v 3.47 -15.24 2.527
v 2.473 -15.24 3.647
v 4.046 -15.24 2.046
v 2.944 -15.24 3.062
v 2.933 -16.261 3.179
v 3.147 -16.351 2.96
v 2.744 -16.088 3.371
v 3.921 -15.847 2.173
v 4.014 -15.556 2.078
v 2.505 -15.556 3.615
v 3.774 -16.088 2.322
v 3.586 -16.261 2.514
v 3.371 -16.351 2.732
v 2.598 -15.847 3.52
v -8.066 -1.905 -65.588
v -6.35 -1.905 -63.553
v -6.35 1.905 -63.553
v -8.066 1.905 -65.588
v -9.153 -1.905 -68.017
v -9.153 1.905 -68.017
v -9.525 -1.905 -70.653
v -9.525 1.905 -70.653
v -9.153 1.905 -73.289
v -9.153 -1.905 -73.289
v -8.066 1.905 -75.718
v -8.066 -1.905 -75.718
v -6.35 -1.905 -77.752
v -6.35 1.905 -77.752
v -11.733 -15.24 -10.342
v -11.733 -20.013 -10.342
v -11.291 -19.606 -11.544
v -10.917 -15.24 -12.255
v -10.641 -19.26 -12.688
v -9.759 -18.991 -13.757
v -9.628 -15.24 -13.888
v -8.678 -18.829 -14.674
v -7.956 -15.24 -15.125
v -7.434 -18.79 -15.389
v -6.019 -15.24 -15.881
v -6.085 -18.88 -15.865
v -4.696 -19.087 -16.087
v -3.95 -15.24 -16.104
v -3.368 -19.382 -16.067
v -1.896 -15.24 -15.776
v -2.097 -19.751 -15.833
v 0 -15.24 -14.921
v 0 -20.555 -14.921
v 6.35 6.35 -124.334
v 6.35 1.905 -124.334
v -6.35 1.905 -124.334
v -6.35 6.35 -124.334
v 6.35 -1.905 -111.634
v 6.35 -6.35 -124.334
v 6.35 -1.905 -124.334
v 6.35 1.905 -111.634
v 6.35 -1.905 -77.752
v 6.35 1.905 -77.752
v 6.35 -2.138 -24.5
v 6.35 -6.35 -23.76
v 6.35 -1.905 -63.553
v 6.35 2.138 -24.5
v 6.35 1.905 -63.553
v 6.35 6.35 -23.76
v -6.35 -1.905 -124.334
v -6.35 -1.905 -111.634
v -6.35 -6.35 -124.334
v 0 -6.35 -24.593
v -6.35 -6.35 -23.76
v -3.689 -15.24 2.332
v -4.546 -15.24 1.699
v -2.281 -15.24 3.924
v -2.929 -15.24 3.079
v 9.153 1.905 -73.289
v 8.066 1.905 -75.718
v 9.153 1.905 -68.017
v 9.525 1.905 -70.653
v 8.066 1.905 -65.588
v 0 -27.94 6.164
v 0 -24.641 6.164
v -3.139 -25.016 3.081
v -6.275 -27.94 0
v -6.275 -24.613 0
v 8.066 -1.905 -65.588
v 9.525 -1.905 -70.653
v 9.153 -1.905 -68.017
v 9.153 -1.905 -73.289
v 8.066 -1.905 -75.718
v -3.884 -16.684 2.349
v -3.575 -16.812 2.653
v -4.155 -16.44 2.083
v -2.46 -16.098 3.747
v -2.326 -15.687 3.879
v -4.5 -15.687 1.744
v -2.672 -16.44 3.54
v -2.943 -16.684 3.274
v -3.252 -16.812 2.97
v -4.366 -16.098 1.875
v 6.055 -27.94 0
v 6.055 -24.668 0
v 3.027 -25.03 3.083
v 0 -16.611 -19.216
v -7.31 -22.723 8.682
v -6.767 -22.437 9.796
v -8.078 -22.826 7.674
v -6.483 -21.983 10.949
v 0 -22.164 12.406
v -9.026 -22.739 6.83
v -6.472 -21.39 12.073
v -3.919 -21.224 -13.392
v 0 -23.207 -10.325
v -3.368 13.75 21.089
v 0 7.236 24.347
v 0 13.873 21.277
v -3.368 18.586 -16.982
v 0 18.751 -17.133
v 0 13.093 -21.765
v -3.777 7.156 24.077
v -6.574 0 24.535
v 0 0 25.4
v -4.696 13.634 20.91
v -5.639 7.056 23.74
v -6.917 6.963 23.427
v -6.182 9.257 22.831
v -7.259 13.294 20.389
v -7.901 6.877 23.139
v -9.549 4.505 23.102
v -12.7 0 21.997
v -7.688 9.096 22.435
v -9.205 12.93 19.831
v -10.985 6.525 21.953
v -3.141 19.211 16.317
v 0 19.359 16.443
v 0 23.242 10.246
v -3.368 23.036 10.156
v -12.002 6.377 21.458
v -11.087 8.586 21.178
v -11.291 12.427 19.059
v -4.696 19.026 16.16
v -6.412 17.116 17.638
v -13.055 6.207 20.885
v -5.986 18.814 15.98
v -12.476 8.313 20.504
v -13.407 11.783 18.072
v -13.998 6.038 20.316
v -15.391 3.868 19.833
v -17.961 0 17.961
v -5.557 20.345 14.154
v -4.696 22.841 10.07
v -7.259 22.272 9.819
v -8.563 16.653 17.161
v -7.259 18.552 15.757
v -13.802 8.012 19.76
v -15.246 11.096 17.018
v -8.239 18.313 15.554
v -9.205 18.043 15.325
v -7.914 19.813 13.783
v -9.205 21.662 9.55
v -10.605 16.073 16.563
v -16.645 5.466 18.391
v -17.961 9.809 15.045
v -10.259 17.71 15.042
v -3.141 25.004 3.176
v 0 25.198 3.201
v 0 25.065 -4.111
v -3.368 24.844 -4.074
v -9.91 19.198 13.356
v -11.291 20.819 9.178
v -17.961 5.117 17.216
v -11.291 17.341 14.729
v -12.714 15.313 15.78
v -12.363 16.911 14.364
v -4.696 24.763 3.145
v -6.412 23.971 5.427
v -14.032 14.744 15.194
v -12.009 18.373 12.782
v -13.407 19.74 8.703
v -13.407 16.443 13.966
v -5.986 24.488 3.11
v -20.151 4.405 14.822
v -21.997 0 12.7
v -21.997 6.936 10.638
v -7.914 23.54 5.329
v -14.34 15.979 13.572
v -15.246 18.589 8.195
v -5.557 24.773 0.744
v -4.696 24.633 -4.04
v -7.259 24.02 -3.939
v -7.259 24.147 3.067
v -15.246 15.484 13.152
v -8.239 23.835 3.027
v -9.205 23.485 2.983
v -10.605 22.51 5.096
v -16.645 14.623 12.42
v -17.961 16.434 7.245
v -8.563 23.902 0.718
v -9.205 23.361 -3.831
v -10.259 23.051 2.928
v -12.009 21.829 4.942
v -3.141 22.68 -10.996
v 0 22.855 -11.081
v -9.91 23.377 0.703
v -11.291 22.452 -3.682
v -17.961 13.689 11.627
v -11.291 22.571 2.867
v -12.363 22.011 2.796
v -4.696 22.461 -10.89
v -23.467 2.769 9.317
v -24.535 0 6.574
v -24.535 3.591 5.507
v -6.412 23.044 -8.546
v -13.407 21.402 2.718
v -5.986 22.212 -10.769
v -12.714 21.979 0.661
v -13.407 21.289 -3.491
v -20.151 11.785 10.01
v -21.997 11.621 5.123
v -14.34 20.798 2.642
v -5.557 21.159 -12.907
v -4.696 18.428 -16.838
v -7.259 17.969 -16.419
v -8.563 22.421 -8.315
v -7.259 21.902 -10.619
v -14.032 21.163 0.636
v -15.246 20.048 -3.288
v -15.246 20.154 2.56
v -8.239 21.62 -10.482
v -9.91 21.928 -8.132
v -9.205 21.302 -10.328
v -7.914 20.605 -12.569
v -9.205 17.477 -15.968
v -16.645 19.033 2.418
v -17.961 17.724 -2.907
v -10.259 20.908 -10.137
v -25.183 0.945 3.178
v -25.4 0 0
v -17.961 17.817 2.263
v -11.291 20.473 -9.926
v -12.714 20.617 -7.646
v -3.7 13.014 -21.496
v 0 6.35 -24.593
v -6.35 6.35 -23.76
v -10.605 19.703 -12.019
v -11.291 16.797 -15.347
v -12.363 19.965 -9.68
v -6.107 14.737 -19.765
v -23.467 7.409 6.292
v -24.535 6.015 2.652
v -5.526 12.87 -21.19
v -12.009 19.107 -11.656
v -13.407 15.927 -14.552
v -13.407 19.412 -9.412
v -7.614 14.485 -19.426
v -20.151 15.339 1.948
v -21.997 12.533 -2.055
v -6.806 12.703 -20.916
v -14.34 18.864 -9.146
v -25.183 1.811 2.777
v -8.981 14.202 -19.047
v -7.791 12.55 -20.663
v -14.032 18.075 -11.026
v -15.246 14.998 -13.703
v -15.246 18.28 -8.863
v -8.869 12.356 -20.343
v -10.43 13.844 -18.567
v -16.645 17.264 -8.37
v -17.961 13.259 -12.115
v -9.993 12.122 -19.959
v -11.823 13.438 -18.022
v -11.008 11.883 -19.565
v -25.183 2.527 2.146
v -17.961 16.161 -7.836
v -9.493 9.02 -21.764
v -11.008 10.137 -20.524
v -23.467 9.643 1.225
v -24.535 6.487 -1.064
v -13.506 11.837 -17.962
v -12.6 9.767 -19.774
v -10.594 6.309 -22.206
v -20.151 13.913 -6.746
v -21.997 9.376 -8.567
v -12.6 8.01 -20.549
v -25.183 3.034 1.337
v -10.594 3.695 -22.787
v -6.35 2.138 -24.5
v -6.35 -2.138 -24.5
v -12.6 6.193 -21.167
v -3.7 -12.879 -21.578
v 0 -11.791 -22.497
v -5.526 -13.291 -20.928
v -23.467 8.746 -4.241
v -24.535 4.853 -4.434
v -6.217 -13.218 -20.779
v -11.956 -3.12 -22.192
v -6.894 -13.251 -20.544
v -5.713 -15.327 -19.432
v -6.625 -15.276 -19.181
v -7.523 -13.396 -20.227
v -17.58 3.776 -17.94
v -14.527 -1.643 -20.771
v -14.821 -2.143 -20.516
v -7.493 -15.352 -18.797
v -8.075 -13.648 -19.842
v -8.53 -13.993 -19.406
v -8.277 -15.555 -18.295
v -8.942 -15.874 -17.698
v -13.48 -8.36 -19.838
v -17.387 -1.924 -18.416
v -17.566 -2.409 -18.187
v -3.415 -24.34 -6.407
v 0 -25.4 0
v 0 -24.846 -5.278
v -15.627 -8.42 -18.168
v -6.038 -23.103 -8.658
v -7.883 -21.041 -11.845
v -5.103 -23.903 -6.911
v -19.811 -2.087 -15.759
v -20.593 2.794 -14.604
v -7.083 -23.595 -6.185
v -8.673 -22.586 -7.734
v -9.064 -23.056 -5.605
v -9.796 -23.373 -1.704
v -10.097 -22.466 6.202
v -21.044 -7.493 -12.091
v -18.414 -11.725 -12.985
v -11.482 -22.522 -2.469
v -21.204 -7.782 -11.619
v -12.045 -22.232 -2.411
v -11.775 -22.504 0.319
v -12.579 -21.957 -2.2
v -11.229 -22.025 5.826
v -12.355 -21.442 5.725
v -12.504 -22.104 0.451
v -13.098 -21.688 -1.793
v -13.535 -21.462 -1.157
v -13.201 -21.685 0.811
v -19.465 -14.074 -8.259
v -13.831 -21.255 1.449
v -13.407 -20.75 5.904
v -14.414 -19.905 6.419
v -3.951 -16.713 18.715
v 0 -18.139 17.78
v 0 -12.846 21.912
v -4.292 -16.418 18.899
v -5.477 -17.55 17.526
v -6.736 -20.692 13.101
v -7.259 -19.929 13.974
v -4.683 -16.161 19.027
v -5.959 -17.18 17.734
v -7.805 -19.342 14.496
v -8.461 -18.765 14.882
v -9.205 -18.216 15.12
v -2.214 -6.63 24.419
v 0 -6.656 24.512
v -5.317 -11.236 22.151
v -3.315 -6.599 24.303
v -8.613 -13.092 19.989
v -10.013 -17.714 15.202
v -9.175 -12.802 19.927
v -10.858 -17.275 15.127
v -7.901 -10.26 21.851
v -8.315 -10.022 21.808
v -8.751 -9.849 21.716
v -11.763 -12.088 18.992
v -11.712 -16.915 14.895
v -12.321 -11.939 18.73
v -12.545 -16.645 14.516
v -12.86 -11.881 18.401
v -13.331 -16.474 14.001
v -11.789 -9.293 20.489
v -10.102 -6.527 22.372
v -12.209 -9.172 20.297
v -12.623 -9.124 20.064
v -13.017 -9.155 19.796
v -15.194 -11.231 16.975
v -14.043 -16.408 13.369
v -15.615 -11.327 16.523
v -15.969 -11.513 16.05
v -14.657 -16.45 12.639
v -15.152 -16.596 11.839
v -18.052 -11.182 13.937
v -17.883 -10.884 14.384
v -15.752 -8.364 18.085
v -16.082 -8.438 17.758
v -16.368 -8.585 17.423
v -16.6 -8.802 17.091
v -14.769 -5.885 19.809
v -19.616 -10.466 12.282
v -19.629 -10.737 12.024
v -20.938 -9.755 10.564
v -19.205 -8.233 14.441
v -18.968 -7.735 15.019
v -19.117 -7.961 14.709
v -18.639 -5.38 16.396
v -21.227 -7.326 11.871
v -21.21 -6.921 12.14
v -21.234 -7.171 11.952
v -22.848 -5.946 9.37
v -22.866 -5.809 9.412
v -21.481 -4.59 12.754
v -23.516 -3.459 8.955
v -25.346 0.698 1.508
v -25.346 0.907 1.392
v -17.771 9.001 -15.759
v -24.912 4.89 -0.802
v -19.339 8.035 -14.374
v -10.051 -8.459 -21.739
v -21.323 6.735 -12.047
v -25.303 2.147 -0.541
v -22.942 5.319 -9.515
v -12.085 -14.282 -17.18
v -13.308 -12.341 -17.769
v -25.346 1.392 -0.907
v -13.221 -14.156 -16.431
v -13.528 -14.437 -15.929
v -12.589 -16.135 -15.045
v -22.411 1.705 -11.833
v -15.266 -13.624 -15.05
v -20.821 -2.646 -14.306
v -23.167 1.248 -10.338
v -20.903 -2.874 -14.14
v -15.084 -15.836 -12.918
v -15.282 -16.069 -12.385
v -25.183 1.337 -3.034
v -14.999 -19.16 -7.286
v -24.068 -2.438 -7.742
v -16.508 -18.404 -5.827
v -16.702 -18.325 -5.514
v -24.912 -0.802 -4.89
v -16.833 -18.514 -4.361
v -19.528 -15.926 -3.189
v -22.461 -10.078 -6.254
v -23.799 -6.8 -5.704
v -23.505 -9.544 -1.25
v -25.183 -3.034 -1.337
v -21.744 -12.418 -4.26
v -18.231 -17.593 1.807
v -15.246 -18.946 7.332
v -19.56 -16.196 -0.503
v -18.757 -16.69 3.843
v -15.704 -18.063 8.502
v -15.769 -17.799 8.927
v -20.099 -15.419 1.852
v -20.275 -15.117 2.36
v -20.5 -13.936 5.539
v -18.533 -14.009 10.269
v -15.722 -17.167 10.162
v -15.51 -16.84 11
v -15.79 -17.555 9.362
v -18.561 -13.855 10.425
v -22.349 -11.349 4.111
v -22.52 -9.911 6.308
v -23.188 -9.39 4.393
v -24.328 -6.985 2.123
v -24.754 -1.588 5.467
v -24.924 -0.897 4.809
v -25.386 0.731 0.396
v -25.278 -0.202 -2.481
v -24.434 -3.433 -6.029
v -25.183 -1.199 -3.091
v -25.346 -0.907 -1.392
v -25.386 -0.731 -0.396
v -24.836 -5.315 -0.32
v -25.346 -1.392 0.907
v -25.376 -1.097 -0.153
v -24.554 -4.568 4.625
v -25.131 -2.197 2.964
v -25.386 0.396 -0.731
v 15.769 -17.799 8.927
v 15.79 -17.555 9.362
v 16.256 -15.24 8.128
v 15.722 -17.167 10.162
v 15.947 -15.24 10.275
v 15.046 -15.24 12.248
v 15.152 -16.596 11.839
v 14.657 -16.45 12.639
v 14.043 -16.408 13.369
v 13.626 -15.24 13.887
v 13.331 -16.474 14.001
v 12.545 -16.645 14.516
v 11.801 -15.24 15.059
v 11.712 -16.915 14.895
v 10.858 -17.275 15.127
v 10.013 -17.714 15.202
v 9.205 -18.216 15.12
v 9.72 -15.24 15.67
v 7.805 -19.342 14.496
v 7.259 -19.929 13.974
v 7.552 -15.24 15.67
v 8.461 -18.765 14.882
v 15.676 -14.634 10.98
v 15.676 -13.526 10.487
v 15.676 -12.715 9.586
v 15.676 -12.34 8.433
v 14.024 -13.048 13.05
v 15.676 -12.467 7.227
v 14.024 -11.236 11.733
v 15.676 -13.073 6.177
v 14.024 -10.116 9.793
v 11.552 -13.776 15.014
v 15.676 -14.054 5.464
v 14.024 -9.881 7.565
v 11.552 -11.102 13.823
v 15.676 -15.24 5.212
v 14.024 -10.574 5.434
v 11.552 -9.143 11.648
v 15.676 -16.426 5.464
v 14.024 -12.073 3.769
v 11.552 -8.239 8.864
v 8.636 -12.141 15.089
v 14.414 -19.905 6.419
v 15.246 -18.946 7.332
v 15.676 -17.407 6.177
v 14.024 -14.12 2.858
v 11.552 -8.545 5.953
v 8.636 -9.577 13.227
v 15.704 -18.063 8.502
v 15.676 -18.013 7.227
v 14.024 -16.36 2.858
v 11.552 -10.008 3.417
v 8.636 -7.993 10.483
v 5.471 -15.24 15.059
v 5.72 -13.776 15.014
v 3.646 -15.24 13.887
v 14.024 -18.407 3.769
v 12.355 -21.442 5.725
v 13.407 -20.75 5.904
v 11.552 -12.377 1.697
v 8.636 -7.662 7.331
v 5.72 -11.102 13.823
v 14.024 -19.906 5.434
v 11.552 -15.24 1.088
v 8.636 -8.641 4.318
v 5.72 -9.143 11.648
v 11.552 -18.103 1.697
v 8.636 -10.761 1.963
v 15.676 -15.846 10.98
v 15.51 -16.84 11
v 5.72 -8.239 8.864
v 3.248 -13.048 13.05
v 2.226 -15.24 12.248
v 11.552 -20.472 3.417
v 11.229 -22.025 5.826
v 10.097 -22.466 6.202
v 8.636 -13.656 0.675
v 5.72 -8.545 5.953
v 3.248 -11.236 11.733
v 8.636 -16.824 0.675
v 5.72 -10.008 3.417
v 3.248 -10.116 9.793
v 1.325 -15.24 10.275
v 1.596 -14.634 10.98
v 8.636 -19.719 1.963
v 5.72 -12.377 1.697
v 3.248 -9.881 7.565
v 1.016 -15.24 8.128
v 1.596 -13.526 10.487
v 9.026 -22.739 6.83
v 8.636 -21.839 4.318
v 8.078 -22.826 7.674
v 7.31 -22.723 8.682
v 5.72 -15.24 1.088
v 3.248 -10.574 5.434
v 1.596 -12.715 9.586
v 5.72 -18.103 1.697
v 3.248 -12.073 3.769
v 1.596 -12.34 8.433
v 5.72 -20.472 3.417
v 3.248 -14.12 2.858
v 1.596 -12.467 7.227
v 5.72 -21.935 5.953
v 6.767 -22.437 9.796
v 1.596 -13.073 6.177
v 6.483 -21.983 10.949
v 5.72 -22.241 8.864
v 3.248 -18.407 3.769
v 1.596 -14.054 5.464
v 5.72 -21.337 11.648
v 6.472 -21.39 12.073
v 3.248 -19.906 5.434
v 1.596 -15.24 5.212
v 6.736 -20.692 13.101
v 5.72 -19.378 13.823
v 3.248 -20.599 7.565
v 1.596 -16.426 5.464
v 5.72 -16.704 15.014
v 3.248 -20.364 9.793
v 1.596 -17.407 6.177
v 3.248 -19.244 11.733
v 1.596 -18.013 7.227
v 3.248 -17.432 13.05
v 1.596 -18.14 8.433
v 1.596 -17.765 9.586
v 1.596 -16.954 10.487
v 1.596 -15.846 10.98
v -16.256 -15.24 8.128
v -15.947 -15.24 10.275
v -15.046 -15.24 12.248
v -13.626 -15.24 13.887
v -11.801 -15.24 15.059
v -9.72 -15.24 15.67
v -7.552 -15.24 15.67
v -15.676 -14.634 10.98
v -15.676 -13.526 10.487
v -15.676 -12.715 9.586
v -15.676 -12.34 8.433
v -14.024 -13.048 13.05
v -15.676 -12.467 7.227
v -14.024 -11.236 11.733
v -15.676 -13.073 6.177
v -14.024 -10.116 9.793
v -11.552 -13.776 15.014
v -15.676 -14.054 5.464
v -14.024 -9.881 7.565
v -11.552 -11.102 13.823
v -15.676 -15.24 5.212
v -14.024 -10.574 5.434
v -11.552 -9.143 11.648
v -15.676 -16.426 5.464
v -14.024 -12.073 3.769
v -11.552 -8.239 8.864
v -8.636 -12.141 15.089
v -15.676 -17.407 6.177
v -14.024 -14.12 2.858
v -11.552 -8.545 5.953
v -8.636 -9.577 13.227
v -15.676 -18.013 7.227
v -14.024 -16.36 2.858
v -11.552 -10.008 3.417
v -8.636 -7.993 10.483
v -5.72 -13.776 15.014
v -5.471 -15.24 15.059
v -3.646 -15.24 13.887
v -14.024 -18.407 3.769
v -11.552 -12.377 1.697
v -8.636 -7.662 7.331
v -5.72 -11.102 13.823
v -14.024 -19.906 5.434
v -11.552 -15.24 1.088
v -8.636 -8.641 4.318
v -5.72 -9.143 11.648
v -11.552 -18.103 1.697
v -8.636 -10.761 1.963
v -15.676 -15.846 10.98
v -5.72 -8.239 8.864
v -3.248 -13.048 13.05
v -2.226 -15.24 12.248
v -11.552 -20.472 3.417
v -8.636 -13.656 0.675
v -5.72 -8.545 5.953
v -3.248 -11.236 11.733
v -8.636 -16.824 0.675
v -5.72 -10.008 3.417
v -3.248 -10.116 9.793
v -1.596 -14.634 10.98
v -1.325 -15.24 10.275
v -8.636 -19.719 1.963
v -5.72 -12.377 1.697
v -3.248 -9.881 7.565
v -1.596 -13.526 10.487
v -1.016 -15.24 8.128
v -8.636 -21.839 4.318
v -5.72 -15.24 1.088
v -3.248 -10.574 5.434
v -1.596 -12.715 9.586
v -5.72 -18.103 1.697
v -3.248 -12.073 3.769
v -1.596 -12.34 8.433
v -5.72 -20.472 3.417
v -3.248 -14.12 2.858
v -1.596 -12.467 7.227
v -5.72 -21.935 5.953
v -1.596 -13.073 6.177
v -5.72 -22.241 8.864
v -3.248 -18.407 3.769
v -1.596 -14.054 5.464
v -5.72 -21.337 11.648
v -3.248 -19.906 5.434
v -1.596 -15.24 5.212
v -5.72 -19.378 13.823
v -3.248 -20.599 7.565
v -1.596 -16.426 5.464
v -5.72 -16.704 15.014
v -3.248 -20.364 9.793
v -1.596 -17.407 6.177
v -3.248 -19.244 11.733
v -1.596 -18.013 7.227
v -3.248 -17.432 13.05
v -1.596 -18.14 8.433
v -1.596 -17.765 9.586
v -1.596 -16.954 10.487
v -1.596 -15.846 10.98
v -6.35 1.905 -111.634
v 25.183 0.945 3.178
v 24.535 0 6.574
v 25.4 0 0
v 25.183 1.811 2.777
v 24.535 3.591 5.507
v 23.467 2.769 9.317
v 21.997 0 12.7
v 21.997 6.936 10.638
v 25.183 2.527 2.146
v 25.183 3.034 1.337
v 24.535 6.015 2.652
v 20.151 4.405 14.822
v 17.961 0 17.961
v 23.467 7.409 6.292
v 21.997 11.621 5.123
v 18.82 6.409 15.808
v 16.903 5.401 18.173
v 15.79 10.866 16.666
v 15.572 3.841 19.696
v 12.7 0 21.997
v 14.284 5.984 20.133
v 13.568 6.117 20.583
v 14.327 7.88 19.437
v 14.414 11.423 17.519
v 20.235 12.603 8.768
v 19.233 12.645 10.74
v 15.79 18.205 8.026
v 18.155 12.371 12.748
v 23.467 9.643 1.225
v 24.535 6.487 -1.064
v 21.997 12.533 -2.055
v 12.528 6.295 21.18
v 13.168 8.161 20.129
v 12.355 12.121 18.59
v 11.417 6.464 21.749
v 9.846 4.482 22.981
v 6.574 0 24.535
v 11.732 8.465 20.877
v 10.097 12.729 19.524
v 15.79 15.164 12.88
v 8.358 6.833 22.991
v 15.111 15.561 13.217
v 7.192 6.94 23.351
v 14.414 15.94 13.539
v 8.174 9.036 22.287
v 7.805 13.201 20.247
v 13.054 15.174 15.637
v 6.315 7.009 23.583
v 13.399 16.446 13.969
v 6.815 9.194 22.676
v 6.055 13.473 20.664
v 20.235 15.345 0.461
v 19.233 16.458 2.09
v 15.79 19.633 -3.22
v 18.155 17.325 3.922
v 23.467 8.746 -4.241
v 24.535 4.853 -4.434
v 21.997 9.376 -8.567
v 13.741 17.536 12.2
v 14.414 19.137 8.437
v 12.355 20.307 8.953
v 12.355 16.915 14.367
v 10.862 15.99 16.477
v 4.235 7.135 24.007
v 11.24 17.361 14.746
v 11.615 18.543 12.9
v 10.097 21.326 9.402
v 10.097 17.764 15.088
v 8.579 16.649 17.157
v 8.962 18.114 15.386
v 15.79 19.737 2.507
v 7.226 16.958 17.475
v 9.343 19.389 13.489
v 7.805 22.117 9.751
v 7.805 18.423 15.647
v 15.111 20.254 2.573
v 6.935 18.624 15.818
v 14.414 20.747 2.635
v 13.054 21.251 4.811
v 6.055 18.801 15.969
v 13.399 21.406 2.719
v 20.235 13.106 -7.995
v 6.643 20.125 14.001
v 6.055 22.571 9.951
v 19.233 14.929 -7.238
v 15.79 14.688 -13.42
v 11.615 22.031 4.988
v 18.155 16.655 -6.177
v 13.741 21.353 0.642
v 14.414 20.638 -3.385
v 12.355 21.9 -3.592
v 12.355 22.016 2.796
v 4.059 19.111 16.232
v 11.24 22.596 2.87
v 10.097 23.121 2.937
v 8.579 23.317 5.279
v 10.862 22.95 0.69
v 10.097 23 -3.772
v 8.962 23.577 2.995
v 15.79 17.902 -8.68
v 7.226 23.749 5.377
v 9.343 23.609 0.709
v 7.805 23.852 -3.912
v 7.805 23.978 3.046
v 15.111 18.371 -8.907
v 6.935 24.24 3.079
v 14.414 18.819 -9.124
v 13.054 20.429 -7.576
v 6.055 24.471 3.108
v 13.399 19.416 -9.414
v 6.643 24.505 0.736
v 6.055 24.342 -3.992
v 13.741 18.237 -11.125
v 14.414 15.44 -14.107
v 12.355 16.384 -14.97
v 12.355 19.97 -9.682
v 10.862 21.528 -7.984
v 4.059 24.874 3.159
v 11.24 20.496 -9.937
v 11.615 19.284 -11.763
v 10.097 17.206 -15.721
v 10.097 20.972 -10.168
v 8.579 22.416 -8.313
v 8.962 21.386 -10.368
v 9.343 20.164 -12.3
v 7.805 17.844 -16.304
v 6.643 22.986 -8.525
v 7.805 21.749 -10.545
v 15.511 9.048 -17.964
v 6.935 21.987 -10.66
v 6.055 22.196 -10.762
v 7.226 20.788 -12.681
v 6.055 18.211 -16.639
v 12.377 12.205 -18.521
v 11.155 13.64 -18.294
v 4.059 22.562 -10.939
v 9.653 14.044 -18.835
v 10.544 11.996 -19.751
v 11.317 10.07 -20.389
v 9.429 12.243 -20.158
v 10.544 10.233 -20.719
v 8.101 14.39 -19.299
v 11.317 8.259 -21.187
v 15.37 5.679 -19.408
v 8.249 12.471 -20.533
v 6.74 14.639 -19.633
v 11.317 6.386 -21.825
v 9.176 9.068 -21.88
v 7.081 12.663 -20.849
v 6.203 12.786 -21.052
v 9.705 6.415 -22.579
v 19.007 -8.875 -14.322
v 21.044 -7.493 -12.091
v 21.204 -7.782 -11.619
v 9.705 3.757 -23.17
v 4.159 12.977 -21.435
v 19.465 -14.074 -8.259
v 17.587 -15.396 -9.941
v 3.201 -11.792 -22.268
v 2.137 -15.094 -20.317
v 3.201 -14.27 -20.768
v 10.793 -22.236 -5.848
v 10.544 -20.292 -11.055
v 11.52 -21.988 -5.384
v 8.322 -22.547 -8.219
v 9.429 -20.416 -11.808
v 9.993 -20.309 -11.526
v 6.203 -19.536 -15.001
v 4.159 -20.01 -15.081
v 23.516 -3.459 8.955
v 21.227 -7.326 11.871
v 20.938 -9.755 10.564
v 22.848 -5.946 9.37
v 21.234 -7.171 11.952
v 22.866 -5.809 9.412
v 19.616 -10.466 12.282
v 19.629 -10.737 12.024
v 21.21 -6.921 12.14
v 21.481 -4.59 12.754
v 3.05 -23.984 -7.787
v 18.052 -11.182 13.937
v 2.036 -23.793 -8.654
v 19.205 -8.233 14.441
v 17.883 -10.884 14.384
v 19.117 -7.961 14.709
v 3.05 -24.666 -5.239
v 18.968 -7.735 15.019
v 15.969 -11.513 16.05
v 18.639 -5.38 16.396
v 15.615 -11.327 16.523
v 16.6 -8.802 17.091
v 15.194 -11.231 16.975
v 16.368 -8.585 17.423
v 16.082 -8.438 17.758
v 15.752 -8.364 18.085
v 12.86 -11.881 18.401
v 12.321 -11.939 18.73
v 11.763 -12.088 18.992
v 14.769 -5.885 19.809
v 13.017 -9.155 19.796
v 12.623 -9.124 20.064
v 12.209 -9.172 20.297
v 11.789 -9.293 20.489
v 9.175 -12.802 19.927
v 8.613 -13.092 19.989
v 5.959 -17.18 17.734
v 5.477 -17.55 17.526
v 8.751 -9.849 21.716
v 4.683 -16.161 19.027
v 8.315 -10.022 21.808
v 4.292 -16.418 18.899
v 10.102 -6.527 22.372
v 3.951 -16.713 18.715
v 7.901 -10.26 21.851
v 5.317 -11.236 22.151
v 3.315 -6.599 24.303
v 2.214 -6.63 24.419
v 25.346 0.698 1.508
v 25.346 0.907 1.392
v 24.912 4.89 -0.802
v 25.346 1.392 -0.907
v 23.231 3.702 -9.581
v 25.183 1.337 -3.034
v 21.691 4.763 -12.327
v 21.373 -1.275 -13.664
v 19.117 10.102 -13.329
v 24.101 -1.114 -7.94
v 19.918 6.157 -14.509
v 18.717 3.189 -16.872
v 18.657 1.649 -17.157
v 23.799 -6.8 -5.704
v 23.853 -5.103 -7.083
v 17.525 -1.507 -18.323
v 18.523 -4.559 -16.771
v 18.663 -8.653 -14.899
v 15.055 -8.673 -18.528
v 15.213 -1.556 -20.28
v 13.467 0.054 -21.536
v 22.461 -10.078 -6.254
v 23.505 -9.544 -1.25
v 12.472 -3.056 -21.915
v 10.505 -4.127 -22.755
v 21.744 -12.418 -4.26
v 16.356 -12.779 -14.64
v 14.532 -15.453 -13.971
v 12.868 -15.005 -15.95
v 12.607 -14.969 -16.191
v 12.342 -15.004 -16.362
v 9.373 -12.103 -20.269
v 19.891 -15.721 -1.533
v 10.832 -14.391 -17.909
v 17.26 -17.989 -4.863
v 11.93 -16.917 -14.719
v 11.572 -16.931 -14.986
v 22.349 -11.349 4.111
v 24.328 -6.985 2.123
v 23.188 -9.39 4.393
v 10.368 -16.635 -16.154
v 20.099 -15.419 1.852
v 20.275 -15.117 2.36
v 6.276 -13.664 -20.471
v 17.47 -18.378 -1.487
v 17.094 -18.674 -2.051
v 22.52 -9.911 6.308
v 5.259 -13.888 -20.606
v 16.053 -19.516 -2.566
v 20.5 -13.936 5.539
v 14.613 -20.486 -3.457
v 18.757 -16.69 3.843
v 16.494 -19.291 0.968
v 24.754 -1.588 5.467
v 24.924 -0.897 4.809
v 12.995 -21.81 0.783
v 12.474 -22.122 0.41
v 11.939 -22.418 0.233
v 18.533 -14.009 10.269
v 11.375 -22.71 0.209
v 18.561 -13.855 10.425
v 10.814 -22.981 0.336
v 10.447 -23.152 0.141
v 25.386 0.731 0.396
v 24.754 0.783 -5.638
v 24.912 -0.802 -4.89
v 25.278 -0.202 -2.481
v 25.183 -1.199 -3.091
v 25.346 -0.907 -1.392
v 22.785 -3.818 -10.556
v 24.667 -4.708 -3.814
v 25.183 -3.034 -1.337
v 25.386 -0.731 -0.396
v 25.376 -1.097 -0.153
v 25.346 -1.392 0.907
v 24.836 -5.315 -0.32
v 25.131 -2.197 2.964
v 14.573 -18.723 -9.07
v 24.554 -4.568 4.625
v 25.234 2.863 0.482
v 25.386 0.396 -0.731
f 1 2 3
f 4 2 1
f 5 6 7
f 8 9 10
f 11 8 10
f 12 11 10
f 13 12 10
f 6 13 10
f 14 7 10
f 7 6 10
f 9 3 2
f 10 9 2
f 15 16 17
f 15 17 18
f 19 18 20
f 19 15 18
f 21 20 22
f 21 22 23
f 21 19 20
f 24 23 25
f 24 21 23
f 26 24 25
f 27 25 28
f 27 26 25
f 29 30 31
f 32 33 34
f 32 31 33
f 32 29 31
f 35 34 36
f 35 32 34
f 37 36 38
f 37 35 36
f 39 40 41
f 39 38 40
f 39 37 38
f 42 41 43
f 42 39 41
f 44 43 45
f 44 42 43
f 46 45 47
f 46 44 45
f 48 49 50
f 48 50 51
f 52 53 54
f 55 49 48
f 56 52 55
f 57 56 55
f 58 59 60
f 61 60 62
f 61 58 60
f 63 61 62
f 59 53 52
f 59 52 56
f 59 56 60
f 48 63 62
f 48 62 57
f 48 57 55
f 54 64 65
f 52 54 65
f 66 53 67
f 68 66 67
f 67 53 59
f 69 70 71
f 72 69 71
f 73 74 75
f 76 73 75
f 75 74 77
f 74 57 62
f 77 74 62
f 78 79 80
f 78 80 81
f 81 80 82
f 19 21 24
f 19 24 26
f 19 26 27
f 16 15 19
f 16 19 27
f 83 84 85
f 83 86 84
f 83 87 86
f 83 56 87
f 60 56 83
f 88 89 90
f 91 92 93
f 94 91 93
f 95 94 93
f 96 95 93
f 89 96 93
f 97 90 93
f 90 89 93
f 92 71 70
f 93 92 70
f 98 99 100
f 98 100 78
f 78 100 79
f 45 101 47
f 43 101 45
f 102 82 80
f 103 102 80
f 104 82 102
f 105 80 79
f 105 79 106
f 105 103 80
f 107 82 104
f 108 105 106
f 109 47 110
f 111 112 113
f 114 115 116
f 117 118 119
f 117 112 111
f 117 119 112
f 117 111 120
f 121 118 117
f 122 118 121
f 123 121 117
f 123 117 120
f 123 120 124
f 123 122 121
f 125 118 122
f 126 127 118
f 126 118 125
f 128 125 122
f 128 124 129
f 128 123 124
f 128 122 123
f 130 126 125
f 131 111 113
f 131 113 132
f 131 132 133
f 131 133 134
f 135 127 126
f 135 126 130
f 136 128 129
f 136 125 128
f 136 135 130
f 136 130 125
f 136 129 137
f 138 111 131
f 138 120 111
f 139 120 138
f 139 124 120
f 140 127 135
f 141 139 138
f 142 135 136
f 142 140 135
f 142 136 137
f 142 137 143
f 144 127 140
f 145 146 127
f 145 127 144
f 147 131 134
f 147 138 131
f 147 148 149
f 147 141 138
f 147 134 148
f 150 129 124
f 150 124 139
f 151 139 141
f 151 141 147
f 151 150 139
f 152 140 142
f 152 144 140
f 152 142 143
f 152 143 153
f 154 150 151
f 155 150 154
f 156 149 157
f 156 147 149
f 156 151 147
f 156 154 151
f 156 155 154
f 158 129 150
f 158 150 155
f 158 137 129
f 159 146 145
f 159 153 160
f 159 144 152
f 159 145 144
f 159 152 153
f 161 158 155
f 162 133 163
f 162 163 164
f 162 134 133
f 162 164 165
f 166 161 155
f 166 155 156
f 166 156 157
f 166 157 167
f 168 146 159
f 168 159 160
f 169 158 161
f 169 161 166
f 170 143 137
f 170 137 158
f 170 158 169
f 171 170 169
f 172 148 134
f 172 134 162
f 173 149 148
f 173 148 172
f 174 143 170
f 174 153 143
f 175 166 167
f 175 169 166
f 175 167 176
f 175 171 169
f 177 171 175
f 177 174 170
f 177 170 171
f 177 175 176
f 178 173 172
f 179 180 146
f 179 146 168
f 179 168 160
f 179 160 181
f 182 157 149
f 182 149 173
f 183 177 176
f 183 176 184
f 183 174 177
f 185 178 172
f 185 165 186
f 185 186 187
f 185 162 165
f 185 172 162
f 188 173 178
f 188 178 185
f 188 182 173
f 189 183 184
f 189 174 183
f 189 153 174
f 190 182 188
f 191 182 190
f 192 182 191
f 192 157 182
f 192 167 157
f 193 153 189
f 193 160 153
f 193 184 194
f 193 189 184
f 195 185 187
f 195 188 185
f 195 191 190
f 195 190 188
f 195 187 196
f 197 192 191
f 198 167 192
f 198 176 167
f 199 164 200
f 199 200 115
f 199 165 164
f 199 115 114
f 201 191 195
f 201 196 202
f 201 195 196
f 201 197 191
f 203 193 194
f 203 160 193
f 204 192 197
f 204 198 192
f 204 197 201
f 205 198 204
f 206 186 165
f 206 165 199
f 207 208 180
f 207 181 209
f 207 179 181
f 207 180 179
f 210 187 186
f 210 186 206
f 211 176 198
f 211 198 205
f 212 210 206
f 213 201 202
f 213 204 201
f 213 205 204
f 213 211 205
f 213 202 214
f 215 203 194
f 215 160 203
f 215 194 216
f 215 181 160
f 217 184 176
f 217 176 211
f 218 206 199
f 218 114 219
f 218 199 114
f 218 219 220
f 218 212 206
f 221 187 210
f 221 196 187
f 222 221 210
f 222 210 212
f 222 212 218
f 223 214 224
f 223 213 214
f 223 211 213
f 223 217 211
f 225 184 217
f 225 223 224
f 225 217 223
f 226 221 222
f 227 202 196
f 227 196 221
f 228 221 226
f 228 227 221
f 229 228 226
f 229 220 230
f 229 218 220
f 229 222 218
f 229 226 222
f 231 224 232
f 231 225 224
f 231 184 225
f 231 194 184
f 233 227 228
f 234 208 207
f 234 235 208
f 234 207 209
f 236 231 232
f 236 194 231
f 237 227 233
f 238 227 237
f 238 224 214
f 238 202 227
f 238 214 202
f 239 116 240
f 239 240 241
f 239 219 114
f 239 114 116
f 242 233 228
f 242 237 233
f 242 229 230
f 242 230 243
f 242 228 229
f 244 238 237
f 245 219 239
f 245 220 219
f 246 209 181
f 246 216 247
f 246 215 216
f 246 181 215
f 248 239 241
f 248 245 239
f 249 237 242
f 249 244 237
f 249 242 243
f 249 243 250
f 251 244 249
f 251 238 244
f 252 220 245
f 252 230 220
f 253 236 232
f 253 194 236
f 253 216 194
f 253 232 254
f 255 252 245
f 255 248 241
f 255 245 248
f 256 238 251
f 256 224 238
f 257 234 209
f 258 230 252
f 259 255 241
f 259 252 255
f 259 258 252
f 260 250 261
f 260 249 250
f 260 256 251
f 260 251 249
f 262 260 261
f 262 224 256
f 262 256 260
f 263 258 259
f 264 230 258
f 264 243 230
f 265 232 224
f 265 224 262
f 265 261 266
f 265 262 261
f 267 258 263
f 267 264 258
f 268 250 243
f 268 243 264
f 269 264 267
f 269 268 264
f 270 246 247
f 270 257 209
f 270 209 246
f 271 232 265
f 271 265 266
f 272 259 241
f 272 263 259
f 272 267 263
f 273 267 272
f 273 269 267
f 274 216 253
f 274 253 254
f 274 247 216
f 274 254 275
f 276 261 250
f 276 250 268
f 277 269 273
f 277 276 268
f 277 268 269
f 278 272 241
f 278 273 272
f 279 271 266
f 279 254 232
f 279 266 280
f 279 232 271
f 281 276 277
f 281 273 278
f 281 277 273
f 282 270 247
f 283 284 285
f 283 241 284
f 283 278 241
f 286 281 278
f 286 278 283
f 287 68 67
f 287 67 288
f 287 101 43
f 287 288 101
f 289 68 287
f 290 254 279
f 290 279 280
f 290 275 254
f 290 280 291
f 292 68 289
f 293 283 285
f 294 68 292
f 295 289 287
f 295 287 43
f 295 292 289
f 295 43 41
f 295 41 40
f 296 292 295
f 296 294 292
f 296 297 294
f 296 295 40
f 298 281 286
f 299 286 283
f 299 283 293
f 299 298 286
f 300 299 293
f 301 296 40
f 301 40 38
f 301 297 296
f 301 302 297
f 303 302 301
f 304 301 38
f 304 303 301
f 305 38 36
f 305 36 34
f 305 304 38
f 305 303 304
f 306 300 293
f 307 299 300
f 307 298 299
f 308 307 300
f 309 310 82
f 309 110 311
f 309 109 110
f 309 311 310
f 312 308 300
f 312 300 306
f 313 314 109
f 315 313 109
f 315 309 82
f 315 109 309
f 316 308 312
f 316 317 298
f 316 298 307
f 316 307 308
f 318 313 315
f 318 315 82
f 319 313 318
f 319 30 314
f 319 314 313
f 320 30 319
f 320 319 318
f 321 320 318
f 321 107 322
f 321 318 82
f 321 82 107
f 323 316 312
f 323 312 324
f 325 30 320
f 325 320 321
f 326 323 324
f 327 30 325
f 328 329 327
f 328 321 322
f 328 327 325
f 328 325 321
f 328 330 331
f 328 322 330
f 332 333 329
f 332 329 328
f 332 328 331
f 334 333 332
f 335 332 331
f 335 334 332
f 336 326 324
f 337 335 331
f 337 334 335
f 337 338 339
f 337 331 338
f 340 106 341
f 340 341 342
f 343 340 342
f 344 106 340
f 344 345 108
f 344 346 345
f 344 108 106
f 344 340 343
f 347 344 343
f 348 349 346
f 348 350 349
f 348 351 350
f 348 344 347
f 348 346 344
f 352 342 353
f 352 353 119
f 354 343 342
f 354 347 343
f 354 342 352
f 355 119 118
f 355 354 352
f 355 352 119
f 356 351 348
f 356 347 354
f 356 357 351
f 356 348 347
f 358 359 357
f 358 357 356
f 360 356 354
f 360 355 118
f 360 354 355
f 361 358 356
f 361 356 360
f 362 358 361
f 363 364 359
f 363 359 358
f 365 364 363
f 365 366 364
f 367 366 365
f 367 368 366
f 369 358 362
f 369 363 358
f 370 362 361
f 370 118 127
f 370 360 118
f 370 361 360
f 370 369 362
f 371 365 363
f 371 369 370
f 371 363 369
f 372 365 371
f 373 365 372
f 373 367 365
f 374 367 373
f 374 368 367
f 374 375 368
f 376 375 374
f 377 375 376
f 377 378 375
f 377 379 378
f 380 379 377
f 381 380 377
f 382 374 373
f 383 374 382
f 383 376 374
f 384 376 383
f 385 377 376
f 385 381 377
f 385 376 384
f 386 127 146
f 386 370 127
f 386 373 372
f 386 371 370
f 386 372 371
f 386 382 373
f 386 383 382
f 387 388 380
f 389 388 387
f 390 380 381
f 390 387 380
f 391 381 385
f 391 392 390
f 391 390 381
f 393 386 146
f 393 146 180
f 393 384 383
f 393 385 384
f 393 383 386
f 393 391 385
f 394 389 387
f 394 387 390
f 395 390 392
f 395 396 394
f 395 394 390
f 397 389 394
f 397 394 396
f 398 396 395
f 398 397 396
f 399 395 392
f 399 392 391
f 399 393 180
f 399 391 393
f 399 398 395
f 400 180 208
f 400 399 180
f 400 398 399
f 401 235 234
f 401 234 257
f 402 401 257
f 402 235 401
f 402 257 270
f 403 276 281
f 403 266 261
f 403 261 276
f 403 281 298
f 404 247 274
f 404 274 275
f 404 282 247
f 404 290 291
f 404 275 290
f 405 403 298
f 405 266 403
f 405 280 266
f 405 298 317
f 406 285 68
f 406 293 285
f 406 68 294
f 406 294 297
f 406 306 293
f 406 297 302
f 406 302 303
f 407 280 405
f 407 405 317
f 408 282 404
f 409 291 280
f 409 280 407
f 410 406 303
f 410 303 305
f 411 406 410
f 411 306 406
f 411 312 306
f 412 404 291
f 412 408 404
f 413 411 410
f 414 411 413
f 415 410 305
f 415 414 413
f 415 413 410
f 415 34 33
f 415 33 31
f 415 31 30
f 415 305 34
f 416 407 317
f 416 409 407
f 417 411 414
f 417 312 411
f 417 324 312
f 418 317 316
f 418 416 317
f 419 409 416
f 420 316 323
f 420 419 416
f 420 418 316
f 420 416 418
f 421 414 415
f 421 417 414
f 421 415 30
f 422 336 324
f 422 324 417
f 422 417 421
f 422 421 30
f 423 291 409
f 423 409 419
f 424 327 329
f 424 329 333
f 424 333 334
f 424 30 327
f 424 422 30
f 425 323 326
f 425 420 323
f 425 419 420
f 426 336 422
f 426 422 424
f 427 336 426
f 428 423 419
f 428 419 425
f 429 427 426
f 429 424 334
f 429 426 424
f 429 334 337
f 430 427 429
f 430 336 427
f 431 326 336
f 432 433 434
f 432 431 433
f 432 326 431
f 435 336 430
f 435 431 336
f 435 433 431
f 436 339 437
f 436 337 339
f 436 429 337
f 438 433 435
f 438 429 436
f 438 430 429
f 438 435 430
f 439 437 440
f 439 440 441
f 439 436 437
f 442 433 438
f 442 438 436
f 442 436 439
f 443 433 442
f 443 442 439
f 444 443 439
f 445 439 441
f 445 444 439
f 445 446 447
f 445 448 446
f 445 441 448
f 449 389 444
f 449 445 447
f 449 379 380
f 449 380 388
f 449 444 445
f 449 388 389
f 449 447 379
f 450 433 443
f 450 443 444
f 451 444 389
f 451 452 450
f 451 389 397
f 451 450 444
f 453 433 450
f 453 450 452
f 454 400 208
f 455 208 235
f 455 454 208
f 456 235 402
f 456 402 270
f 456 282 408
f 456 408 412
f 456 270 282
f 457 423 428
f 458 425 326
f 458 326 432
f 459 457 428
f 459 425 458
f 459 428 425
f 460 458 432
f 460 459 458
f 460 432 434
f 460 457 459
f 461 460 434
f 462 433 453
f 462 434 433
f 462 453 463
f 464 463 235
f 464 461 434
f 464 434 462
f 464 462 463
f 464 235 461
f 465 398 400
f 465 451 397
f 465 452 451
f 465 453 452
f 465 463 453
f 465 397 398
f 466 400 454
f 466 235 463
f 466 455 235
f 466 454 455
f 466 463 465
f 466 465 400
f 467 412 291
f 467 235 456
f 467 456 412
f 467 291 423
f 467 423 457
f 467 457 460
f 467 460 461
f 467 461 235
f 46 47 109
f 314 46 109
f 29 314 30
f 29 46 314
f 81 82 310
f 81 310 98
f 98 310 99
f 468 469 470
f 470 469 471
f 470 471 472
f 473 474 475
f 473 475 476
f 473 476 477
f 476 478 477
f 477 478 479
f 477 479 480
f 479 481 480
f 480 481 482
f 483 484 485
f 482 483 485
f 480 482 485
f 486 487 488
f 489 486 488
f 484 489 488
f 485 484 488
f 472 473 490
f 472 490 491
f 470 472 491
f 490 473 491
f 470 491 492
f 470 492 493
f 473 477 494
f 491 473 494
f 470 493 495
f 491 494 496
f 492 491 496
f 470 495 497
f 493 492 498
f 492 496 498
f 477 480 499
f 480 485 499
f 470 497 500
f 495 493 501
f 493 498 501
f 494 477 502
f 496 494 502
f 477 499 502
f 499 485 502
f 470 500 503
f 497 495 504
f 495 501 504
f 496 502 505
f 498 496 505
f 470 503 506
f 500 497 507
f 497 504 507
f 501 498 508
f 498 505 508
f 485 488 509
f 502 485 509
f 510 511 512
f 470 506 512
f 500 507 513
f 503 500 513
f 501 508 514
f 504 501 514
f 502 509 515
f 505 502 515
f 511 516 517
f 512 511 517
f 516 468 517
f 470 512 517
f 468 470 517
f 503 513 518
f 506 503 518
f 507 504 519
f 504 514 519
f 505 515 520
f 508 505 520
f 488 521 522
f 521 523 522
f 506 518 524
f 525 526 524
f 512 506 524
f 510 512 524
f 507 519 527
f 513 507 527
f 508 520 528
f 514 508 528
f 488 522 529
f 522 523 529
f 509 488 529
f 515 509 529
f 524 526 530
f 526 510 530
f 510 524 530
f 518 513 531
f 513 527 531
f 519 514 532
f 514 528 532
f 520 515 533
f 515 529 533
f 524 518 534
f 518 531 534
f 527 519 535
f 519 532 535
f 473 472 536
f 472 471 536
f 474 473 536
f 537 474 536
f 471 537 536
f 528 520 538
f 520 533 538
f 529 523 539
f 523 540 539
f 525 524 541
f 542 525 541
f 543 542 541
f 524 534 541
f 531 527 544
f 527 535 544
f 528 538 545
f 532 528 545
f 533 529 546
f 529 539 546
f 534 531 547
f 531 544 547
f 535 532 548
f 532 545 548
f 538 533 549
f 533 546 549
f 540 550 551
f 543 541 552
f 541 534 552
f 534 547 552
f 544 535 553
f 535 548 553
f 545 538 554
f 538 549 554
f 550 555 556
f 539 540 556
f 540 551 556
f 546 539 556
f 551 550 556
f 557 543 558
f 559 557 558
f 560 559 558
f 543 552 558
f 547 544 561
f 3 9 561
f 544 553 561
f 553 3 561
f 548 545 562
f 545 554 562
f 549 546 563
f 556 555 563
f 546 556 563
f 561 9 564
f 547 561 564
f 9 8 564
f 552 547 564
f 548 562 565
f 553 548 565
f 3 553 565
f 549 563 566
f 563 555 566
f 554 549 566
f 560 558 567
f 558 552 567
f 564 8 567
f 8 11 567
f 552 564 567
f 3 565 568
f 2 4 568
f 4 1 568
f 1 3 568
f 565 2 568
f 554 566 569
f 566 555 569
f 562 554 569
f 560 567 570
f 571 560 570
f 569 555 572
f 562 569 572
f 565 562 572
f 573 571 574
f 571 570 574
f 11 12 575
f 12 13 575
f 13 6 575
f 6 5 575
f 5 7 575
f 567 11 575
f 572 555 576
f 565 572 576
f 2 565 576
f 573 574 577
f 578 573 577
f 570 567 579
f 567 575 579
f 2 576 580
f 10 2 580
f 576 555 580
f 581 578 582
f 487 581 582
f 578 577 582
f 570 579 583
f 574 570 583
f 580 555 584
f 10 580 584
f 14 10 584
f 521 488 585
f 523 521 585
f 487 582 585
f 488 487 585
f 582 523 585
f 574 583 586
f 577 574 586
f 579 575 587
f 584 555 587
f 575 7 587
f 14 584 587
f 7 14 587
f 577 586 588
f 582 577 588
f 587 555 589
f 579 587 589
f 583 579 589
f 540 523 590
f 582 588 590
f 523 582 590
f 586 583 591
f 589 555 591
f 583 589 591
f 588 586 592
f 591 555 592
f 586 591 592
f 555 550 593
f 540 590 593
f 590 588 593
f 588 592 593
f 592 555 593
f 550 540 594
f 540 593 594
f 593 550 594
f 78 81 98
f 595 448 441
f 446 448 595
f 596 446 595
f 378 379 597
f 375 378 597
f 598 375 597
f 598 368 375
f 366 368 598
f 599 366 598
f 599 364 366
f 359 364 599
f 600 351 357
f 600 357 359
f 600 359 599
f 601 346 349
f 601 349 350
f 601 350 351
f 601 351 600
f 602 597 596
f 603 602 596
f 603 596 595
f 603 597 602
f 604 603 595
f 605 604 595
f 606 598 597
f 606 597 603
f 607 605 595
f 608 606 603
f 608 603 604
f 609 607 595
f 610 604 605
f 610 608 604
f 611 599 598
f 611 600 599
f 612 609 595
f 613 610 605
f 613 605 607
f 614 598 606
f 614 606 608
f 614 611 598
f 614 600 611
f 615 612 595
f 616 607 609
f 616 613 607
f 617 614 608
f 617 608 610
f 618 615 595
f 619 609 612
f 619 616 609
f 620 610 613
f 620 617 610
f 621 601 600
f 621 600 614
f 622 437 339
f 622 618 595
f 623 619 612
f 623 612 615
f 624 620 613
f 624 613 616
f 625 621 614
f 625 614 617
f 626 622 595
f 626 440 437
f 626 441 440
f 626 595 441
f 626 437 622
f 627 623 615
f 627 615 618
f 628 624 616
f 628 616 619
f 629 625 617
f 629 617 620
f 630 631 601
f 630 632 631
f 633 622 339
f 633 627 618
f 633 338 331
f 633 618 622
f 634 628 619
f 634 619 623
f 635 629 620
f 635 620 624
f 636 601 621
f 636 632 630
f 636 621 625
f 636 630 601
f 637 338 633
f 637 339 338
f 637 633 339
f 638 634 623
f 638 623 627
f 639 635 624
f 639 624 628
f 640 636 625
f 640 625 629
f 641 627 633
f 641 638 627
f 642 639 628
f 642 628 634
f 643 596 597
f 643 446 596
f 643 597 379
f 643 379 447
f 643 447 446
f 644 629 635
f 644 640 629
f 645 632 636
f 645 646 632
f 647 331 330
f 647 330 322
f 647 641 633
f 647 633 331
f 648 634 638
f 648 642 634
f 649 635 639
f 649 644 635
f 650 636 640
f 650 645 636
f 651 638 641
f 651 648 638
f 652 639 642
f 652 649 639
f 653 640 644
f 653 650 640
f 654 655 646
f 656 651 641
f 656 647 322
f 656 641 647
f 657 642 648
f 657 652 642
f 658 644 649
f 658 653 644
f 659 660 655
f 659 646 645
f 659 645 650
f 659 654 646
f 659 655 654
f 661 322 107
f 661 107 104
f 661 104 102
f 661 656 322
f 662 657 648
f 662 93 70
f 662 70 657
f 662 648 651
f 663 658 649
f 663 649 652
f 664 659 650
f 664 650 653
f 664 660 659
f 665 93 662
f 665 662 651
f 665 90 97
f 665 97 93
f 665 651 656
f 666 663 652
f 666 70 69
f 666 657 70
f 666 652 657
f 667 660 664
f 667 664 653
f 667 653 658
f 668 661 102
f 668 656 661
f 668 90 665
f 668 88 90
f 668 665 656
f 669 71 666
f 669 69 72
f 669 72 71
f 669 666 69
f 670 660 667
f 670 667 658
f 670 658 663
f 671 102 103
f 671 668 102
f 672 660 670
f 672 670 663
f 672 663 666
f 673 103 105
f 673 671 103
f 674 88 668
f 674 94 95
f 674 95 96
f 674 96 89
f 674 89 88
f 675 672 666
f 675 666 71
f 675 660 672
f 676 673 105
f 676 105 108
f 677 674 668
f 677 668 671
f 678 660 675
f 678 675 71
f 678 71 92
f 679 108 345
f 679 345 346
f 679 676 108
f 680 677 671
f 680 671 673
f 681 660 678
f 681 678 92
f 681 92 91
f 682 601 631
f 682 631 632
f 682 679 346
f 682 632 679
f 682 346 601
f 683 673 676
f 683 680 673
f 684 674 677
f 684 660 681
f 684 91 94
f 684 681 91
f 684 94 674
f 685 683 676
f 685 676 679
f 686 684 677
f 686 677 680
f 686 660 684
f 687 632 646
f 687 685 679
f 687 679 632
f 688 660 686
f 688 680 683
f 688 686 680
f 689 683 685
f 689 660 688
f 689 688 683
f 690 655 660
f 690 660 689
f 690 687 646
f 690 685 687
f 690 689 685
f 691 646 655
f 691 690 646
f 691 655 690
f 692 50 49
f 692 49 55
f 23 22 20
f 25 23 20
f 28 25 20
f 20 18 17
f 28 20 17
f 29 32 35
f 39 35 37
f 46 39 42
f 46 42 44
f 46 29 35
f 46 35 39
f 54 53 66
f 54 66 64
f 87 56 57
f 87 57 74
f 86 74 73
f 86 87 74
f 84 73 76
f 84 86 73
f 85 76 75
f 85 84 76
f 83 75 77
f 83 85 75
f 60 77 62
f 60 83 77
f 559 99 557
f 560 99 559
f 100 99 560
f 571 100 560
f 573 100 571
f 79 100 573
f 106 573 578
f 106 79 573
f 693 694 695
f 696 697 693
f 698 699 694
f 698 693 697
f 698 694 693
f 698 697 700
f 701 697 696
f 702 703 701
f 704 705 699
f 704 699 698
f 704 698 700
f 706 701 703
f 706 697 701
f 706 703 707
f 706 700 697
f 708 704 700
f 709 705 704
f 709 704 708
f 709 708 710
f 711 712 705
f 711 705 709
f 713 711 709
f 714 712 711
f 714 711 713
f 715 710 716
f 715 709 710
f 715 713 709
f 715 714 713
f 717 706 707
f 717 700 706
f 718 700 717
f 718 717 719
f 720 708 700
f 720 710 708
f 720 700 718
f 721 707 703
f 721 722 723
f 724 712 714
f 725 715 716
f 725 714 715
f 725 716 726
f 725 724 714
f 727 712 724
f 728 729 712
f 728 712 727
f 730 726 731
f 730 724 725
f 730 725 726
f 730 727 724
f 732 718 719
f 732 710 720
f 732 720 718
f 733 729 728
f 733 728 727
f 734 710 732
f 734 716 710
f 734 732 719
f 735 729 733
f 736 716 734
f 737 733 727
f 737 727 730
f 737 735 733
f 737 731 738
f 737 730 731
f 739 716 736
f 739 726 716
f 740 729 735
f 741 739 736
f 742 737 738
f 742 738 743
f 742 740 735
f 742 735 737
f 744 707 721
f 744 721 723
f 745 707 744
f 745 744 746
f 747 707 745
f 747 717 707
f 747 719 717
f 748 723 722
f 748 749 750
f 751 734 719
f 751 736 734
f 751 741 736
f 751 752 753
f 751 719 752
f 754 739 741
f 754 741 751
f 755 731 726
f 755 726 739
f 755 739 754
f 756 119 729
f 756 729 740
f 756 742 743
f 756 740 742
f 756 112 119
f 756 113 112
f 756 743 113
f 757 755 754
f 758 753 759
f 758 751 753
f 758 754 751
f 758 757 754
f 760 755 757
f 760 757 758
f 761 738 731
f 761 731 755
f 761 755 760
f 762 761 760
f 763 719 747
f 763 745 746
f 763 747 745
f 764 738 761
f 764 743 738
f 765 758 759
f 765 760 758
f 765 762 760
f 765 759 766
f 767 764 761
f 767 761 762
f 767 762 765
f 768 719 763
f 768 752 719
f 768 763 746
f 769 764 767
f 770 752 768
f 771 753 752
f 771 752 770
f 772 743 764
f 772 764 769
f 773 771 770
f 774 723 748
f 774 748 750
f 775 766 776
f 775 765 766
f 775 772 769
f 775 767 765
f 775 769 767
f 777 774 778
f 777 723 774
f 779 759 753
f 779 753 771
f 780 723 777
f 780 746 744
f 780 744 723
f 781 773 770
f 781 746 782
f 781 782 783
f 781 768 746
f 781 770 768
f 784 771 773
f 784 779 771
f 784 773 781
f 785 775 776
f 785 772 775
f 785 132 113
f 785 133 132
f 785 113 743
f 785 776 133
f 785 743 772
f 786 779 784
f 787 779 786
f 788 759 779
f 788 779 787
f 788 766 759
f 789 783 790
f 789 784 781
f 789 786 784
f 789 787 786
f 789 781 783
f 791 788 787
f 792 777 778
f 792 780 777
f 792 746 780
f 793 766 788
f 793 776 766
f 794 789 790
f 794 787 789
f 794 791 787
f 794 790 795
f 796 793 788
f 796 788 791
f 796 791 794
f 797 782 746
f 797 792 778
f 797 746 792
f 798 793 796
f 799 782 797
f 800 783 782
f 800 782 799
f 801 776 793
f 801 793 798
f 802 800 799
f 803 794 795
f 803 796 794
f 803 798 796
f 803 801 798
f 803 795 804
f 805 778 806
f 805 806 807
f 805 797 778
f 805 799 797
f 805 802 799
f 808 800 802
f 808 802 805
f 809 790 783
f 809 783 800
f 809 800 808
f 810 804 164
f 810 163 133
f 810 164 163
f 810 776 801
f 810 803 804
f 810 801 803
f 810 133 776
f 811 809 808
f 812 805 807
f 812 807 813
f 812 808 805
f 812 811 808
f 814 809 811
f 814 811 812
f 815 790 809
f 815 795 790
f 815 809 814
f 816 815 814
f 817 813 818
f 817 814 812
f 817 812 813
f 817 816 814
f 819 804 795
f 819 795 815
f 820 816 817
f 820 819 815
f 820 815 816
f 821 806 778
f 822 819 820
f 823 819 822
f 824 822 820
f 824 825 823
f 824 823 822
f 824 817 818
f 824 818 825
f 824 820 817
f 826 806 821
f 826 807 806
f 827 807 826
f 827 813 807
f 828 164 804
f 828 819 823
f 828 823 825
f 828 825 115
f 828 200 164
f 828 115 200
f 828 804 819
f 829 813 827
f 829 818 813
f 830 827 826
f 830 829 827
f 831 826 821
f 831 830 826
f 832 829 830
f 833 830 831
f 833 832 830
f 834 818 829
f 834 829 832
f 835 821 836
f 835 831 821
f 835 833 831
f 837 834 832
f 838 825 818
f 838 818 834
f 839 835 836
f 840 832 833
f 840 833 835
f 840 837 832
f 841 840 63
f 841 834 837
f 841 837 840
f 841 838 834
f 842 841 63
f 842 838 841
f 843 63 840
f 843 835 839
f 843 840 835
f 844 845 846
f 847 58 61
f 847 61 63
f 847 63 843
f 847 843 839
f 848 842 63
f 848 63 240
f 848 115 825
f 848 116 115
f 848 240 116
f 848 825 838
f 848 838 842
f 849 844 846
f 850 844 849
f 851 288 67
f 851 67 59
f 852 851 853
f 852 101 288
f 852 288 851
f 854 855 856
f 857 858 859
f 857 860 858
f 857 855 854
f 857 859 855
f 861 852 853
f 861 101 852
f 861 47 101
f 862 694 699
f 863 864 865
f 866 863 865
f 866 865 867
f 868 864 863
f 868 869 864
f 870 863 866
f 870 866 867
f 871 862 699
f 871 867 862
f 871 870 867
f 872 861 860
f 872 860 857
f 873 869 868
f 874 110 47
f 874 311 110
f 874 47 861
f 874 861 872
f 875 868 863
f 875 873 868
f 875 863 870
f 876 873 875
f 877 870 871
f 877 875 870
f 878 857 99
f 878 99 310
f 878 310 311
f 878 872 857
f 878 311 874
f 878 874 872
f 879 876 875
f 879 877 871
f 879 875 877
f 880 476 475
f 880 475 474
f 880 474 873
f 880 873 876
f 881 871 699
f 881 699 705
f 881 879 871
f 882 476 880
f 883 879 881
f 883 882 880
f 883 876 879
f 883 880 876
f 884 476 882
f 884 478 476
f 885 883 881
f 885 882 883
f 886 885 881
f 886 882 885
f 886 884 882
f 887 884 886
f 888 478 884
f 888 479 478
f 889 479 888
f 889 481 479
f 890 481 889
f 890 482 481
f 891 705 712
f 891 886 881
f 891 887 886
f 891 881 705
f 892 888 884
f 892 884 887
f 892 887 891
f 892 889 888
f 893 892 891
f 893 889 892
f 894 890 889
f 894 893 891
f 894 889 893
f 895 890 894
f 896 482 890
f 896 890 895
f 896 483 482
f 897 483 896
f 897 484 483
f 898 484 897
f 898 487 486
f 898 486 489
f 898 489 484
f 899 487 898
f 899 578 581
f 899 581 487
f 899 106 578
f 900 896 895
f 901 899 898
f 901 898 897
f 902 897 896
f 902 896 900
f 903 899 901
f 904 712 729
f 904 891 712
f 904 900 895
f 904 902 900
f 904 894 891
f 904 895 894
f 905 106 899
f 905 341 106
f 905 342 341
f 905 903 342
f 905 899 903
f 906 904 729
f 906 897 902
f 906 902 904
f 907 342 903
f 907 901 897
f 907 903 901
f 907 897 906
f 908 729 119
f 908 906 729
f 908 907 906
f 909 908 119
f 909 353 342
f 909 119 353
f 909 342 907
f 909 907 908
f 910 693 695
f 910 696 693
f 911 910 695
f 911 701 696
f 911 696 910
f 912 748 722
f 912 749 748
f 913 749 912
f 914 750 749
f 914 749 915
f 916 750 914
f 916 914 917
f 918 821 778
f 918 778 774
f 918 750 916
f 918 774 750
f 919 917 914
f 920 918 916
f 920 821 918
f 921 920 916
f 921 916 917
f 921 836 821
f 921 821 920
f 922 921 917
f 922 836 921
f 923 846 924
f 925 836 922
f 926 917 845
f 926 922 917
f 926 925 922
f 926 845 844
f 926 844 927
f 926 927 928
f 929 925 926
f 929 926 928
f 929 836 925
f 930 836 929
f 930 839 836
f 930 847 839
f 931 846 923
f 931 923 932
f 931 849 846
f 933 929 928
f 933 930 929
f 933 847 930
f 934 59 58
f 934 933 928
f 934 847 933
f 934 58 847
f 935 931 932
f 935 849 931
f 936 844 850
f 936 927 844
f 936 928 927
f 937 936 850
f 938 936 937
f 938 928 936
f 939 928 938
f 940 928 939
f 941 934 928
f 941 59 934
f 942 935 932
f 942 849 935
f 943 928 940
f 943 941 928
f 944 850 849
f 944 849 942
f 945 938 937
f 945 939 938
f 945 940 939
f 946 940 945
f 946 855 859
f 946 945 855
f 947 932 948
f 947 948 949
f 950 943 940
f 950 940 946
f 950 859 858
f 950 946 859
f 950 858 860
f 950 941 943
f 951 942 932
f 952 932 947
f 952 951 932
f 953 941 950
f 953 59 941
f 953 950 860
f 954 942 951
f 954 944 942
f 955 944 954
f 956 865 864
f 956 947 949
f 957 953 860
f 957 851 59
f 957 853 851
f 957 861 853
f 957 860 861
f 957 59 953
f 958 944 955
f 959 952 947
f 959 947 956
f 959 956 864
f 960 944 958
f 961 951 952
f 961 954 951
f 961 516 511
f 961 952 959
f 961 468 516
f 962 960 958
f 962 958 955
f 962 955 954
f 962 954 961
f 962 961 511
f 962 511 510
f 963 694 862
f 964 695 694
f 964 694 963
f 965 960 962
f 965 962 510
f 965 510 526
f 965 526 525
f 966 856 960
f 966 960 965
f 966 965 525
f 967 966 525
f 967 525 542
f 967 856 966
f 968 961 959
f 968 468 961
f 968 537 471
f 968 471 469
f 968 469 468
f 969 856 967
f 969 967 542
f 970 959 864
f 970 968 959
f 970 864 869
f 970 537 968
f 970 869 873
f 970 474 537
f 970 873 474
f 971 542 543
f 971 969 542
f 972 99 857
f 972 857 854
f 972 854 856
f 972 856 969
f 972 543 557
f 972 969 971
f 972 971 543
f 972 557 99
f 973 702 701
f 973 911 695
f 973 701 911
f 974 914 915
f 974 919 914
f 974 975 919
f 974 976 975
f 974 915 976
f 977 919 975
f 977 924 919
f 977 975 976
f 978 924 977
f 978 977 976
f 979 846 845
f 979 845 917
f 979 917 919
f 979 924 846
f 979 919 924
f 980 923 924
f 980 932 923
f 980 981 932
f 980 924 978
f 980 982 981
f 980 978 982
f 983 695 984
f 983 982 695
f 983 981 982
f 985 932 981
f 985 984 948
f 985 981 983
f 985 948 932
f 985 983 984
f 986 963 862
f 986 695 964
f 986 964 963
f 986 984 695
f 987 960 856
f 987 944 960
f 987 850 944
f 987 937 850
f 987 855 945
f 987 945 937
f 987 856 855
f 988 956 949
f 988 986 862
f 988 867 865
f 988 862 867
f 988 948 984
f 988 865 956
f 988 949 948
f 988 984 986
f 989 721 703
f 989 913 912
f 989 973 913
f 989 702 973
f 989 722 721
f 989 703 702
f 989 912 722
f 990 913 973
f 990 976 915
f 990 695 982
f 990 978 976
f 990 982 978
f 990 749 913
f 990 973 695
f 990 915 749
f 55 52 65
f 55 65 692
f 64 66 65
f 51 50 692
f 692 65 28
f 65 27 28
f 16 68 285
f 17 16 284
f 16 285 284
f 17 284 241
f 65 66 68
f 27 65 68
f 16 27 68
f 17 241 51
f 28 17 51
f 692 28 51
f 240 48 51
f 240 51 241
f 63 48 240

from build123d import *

# Parameters (mm, degrees)
F8_DEPTH  = 12.7
F10_DEPTH = 38.1
F11_W     = 12.7
F11_H     = 127
F12_DEPTH = 6.35
F13_W     = 3.81
F13_H     = 12.7
F14_DEPTH = 12.7
F15_R     = 9.525
F16_DEPTH = 1.905


with BuildPart() as f1:
    # F0 (on Front) → F1 (revolve)
    with BuildSketch(Plane.XZ):
        with BuildLine():
            Line((-25.4, 0), (0, 0))
            Line((0, 0), (25.4, 0))
            ThreePointArc((25.4, 0), (17.960512, 17.960512), (0, 25.4))
            ThreePointArc((0, 25.4), (-17.960512, 17.960512), (-25.4, 0))
        make_face()
    revolve(axis=Axis((-12.7, 0, 0), (-1, 0, 0)))

    # F4 (on plane+point) → F5 (revolve, cut)
    with BuildSketch(Plane.XZ.offset(15.24)):
        with BuildLine():
            Line((1.016, 8.128), (16.256, 8.128))
            ThreePointArc((16.256, 8.128), (8.636, 15.748), (1.016, 8.128))
        make_face()
    revolve(axis=Axis((8.636, -15.24, 8.128), (-1, 0, 0)), mode=Mode.SUBTRACT)

    # F6: F1 across plane


with BuildPart() as f1_1:
    add(f1.part)
    add(f1.part.mirror(Plane.YZ), mode=Mode.INTERSECT)

    # F7 (on plane+point) → F8 (join)
    with BuildSketch(Plane.XZ.offset(15.24)):
        Polygon((0, 6.164311), (-6.275294, 0), (6.05529, 0), align=None)
    extrude(amount=F8_DEPTH)

    # F9 (on plane+point) → F10 (cut)
    with BuildSketch(Plane.XZ.offset(15.24)):
        with BuildLine():
            Line((0, -14.921401), (-11.733207, -10.342062))
            ThreePointArc((-11.733207, -10.342062), (-7.012469, -15.567675), (0, -14.921401))
        make_face()
    extrude(amount=F10_DEPTH, mode=Mode.SUBTRACT)

    # F11 (on Right) → F12 (join, symmetric)
    with BuildSketch(Plane.YZ):
        with Locations((0, -60.833758)):
            Rectangle(F11_W, F11_H)
    extrude(amount=F12_DEPTH, both=True)

    # F13 (on face) → F14 (cut, symmetric)
    with BuildSketch(Plane.YZ.offset(6.35)):
        with Locations((0, -117.983758)):
            Rectangle(F13_W, F13_H)
    extrude(amount=F14_DEPTH, both=True, mode=Mode.SUBTRACT)

    # F15 (on Front) → F16 (join, symmetric)
    with BuildSketch(Plane.XZ):
        with Locations((0, -70.652964)):
            Circle(F15_R)
    extrude(amount=F16_DEPTH, both=True)


solid = f1_1.part
